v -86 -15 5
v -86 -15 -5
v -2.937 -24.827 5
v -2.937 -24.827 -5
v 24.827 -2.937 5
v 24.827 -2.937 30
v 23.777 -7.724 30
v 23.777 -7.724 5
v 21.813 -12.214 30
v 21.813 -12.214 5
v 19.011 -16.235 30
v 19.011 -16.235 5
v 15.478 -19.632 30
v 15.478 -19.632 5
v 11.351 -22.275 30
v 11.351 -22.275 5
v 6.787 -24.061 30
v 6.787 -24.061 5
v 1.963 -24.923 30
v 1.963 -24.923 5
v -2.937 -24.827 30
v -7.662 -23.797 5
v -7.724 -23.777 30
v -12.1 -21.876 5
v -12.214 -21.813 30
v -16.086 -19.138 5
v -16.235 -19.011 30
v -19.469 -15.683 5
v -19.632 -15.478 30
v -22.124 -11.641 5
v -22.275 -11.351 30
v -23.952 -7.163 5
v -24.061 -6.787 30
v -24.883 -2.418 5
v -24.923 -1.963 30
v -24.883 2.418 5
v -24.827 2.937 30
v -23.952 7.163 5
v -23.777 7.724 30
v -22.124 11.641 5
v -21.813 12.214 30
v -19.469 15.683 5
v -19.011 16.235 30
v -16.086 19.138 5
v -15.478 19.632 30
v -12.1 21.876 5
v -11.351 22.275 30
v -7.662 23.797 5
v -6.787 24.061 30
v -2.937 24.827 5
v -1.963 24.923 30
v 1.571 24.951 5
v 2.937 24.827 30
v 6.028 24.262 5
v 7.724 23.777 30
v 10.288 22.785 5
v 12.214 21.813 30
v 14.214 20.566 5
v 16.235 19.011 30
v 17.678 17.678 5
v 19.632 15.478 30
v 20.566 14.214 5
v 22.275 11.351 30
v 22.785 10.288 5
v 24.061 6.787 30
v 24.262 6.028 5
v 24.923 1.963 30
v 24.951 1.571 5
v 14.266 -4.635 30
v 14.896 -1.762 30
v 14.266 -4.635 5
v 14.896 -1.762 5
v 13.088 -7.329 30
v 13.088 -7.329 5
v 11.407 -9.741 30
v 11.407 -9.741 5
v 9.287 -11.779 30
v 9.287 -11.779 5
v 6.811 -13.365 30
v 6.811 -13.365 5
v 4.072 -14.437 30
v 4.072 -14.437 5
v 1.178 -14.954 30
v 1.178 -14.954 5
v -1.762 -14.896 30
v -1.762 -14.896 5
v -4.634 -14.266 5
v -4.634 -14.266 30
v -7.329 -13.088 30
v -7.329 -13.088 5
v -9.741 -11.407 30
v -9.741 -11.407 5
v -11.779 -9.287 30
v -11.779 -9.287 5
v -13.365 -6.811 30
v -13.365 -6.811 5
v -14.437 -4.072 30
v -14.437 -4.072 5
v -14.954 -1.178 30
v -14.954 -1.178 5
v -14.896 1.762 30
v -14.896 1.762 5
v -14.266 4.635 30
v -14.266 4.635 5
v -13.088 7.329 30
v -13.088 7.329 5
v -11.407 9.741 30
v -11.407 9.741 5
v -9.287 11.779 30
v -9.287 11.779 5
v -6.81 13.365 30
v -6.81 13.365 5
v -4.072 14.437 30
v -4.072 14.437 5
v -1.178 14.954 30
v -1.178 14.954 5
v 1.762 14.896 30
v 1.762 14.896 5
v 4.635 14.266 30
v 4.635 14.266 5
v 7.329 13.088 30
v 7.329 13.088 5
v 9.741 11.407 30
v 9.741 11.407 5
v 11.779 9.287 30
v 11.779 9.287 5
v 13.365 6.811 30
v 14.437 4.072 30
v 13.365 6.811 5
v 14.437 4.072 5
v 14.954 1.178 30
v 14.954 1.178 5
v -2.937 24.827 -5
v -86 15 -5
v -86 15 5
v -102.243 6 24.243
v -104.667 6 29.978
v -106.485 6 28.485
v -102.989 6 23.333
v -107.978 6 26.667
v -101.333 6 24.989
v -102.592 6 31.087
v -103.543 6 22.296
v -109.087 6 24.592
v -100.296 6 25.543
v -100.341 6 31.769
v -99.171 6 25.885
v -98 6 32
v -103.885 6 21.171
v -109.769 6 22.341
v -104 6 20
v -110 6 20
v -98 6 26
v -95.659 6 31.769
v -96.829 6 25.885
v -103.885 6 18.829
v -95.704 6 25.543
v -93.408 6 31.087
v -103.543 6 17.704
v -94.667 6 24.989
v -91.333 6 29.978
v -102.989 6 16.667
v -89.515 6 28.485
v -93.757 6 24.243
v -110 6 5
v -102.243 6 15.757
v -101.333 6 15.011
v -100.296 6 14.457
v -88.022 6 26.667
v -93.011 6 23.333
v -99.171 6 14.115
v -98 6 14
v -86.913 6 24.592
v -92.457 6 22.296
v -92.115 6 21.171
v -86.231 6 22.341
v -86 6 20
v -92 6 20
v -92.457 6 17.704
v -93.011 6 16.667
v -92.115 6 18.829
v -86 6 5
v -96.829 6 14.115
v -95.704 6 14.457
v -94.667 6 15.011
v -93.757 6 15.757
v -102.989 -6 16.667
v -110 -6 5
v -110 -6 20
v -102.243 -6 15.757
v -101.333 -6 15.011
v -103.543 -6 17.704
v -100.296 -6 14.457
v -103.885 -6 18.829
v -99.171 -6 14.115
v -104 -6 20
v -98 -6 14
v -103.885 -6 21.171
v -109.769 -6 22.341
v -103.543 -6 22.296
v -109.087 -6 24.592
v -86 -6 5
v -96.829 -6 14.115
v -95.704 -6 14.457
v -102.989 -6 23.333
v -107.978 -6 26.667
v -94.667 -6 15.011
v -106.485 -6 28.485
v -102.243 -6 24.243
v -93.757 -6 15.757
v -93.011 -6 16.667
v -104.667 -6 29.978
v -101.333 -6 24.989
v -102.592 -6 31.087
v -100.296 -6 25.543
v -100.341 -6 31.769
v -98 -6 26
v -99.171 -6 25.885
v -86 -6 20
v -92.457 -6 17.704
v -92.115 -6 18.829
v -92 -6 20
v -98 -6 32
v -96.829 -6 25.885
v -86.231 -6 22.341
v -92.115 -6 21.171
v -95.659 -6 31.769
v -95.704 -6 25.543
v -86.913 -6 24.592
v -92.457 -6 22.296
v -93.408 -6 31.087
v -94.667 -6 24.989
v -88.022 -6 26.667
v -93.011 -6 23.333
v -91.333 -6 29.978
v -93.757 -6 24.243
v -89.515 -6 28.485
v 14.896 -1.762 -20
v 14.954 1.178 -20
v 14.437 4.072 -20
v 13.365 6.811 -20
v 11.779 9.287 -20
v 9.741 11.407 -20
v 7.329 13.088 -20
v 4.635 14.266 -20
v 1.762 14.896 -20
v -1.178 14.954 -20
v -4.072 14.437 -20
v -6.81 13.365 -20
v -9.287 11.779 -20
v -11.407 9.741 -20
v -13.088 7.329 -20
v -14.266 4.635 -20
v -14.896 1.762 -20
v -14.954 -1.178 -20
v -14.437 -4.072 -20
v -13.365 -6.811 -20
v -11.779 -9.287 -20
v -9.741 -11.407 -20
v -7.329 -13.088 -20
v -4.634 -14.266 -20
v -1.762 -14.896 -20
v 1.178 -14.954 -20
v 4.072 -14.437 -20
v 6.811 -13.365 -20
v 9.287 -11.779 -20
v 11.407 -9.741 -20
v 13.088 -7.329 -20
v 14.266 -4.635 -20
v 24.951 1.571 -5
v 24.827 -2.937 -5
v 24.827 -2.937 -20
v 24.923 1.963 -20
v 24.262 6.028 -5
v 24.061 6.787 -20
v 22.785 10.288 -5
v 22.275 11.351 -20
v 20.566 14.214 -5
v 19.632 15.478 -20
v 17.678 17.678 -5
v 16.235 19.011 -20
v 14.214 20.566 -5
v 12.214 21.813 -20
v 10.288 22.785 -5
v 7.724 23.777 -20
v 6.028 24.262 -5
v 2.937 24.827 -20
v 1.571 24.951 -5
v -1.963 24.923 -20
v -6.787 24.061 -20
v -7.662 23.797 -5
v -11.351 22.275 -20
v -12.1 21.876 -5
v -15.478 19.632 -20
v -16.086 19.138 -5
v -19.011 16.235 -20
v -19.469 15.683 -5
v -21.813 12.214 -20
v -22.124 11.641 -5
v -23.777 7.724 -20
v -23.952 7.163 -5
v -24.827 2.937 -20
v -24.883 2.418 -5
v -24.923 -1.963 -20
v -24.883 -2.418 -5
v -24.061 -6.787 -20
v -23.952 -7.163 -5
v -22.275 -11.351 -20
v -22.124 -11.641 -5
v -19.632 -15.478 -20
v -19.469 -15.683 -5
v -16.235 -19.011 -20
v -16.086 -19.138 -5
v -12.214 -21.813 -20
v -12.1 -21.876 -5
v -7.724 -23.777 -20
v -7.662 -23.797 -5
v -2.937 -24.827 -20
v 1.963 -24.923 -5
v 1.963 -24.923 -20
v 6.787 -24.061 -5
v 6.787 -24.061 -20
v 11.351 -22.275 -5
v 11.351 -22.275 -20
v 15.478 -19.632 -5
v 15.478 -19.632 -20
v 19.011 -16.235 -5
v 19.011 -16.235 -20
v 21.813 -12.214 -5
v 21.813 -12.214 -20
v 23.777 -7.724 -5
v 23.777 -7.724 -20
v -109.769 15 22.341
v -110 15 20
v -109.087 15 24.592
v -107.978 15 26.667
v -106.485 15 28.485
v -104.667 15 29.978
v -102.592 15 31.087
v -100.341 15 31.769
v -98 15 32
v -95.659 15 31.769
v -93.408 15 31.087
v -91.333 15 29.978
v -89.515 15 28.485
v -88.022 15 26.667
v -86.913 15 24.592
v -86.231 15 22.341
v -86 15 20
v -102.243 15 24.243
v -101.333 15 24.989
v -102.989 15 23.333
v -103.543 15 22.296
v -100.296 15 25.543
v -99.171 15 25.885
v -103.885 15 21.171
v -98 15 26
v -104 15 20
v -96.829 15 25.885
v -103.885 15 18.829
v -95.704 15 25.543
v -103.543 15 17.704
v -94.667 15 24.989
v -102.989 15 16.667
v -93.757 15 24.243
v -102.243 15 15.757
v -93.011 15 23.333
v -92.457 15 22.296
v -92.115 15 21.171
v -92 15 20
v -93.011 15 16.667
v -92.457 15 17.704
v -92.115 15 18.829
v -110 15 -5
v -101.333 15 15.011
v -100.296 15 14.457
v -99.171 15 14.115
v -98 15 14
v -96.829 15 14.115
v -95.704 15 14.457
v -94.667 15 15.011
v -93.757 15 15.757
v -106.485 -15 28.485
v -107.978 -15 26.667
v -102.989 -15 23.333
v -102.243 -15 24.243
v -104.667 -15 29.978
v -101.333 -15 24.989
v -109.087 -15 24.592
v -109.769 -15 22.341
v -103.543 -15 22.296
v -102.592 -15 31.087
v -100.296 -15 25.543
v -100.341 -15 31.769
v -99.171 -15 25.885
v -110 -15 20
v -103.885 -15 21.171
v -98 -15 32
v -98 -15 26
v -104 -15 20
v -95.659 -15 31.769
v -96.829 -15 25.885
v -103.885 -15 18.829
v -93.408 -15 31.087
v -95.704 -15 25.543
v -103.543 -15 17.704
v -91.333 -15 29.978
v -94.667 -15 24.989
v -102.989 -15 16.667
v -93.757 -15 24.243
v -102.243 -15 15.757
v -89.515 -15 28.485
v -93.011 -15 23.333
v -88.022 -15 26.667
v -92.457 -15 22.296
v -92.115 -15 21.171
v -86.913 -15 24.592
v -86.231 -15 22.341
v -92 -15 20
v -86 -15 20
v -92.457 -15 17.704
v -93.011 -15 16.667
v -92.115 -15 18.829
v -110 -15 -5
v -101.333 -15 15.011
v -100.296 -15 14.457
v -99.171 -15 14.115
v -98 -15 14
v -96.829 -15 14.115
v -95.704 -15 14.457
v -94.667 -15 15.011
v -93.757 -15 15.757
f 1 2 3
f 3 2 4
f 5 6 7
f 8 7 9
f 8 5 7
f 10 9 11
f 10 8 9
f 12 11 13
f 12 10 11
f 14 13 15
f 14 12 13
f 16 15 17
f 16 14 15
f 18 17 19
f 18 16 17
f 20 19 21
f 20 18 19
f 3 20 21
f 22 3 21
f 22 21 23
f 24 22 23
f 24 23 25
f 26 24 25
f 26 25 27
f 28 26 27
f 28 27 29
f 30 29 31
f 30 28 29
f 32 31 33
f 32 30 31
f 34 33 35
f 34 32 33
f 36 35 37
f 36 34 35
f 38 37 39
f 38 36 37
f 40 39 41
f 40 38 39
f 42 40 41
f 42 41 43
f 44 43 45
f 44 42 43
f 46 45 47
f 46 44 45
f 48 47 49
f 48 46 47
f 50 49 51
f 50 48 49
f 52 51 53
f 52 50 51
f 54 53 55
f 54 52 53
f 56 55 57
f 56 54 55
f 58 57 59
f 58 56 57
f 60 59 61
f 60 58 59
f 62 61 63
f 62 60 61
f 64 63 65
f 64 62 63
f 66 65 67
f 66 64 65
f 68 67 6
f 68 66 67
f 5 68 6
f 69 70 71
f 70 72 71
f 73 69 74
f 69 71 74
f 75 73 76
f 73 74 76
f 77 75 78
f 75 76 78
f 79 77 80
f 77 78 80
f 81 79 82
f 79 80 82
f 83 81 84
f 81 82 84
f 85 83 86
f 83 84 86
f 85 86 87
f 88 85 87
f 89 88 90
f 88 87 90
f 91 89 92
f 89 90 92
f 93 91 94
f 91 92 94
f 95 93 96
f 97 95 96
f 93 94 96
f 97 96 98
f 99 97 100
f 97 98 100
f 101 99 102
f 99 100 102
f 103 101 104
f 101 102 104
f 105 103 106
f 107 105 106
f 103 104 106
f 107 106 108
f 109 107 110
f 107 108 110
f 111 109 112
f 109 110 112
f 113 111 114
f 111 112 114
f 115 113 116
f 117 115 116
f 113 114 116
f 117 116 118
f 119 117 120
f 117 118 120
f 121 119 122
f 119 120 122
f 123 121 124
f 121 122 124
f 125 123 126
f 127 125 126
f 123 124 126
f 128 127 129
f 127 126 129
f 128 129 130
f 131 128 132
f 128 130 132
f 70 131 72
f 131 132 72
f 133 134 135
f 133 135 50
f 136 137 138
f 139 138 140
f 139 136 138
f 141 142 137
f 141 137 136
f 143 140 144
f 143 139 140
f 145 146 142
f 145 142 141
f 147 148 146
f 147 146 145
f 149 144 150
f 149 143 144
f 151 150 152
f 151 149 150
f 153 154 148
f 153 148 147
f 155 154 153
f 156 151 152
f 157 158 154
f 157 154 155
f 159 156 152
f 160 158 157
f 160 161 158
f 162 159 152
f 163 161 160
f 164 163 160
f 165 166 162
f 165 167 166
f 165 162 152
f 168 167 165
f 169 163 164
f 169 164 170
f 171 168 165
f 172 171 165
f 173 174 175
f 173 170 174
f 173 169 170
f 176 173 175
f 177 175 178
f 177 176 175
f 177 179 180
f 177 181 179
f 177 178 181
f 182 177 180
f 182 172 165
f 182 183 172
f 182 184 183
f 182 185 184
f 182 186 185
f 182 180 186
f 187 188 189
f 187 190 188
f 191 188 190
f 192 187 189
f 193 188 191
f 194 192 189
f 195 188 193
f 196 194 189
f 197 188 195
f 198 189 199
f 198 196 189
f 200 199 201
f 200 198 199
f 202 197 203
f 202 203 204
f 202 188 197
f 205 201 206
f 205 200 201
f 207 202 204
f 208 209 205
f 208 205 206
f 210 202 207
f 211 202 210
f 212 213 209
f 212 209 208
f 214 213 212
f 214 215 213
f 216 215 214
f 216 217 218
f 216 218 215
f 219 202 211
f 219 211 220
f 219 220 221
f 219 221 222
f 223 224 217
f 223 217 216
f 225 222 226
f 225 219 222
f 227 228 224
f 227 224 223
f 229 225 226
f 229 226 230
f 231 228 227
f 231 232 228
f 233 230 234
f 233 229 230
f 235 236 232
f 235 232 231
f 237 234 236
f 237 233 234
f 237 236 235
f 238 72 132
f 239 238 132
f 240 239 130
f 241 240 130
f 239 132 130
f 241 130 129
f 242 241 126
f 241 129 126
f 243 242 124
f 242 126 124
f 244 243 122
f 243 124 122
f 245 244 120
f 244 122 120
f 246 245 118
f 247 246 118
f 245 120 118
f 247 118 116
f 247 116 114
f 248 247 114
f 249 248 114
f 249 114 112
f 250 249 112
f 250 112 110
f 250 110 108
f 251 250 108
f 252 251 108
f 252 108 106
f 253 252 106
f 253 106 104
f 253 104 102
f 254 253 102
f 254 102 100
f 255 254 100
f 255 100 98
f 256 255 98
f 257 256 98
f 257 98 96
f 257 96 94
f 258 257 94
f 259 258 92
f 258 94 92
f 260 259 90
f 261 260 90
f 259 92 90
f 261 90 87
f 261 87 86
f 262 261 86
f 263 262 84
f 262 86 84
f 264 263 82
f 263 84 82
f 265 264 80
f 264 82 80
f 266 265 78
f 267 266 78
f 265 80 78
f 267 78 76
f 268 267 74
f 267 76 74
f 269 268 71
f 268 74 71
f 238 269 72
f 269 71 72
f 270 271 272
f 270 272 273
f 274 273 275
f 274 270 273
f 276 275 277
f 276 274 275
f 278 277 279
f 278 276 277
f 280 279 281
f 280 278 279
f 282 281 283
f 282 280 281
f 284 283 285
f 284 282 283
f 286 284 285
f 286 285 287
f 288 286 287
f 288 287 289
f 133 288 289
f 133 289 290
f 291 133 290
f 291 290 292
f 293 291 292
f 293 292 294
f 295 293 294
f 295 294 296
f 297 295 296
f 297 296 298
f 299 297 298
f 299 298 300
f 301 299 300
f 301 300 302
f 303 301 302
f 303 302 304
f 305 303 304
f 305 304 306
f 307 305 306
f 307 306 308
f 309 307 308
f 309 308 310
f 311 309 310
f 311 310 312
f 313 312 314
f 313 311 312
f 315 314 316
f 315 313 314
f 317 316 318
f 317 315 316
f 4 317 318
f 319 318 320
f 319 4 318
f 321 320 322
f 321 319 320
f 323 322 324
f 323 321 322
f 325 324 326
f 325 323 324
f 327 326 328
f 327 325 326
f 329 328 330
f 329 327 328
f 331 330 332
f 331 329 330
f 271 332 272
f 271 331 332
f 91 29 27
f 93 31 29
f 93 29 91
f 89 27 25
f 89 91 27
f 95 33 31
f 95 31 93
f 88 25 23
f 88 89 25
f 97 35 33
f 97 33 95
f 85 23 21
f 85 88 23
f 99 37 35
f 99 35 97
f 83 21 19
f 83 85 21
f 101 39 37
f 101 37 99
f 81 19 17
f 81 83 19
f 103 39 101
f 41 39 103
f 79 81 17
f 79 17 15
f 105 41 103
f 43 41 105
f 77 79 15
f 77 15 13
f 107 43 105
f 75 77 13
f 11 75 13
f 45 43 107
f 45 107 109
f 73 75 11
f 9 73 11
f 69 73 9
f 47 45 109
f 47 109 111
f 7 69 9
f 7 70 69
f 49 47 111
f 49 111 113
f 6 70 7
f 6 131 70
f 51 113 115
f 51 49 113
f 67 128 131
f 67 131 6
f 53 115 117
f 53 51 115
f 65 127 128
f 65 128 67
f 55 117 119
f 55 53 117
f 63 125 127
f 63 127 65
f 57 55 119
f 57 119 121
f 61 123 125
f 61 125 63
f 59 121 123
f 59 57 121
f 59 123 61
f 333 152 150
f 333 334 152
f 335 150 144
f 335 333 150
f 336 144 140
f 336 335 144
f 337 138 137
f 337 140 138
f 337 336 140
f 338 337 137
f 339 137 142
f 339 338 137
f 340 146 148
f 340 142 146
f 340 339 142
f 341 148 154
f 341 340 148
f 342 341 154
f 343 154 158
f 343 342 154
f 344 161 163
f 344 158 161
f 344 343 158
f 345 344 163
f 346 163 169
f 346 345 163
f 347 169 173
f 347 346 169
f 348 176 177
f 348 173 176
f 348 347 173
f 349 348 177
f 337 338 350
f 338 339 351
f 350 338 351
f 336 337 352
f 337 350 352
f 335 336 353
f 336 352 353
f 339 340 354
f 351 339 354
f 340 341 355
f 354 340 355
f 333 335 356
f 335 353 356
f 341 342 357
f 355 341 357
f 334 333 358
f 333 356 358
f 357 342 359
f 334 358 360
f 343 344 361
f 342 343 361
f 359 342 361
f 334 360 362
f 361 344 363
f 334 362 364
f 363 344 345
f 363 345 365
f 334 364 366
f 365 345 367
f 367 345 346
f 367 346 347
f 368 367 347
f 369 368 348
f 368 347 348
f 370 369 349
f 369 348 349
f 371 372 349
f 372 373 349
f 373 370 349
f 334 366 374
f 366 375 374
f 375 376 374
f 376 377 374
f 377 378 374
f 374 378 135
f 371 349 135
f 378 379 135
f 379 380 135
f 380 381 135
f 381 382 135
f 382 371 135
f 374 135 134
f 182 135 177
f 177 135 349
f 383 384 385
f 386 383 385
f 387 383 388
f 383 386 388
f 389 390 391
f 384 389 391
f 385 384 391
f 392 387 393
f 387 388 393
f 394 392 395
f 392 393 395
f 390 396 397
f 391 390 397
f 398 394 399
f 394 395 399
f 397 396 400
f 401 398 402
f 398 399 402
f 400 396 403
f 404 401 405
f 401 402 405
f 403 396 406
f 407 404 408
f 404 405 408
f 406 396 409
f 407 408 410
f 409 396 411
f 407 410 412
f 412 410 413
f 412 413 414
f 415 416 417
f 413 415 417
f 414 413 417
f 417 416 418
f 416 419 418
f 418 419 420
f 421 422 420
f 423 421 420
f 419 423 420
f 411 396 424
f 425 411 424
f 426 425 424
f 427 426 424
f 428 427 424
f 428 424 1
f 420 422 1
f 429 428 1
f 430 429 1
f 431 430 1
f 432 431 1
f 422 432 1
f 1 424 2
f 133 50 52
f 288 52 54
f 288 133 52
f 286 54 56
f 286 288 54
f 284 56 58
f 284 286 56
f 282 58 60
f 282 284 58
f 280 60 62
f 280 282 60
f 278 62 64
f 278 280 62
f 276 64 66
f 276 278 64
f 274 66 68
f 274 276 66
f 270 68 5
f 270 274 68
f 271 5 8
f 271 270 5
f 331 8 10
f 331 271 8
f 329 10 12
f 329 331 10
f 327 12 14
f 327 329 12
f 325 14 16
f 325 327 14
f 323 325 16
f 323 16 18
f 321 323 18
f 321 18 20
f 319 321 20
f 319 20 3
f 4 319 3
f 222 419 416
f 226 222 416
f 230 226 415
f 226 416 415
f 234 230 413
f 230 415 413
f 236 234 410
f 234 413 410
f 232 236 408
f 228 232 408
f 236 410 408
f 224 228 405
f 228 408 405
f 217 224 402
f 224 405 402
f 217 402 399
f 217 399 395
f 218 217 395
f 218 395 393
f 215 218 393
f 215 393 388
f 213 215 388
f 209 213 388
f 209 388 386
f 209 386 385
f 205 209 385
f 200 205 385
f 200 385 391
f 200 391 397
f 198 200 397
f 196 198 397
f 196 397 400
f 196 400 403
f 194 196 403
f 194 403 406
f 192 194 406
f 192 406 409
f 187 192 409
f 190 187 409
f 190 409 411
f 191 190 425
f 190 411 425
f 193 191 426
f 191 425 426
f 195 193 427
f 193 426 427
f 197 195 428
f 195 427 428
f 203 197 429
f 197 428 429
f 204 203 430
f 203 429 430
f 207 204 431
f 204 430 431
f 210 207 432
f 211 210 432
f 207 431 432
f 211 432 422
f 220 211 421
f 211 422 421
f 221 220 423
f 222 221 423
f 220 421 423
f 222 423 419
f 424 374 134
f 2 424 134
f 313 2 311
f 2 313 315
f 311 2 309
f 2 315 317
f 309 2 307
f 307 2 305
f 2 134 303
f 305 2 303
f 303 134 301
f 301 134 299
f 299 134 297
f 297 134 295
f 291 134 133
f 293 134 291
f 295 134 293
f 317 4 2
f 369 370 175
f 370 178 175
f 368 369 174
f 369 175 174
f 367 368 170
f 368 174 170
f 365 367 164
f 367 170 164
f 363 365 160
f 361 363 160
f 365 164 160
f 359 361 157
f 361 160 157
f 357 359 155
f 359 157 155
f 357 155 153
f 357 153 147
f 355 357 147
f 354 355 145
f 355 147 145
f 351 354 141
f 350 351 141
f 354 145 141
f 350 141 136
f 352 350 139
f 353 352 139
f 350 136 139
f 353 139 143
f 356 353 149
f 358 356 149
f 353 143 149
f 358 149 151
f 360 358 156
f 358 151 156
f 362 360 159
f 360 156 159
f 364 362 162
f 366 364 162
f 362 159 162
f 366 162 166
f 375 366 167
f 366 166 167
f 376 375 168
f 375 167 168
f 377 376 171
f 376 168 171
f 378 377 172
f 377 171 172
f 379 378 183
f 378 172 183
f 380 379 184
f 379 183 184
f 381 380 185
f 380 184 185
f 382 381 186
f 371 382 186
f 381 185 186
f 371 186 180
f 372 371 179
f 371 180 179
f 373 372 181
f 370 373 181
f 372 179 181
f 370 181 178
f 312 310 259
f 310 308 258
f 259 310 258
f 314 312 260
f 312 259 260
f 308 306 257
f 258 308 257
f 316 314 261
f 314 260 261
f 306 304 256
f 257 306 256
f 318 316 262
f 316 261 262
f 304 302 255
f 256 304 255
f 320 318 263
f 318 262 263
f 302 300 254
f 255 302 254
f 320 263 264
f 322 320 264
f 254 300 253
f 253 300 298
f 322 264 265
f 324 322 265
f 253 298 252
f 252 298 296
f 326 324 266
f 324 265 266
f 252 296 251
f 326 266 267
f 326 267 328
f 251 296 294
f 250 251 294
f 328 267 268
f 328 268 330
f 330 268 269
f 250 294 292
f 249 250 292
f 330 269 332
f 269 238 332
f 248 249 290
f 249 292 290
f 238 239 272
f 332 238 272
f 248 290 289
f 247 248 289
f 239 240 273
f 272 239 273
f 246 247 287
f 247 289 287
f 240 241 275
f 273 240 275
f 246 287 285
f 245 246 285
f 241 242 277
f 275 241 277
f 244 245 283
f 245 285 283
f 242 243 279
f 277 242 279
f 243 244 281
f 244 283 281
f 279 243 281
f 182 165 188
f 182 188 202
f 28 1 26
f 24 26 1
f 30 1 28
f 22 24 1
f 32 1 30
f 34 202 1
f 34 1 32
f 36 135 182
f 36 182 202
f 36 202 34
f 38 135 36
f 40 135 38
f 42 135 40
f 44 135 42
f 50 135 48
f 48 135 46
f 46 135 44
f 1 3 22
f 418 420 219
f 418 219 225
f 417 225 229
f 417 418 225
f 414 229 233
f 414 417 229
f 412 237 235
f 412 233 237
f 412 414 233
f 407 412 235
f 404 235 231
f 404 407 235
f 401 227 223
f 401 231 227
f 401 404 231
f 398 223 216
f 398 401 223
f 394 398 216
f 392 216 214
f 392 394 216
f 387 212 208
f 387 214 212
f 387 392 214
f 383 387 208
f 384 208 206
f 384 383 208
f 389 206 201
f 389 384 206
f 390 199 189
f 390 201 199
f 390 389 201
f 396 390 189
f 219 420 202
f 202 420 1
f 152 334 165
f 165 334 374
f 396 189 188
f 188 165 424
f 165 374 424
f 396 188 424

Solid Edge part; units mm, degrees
sketch "Sketch1" plane through (0, 0, 0) normal (0, 0, 1) x (1, 0, 0)
  line L0 (-86, -15) -> (-2.9372, -24.8269)
  line L1 (-86, 15) -> (-2.9372, 24.8269)
  line L2 (-110, 15) -> (-86, 15)
  line L3 (-110, 0) -> (-110, 15)
  line L4 (-110, 0) -> (-110, -15)
  line L5 (-110, -15) -> (-86, -15)
  arc A0 (-2.9372, 24.8269) -> (-2.9372, -24.8269) centre (0, 0) cw
extrude "Protrusion1" add sketch "Sketch1" along normal mid plane 10
sketch "Sketch2" plane through (-42.5, 0, 5) normal (0, 0, 1) x (0.9930744, -0.117487, 0)
  circle A0 centre (42.2057, 4.9932) radius 25
extrude "ExtrudedProtrusion_2" add sketch "Sketch2" along normal mid plane 50
sketch "Sketch3" plane through (-42.5, 0, 5) normal (0, 0, 1) x (0.9930744, -0.117487, 0)
  circle A0 centre (42.2057, 4.9932) radius 15
extrude "Cutout1" cut sketch "Sketch3" along normal through all and the other way through all
sketch "Sketch4" plane through (-98, -15, 0) normal (0, -1, 0) x (1, 0, 0)
  line L0 (12, 20) -> (12, -5)
  arc A0 (-12, 20) -> (12, 20) centre (0, 20) cw
  line L1 (-12, -5) -> (-12, 20)
extrude "ExtrudedProtrusion_3" add sketch "Sketch4" against normal blind 9 material side at (-85.95, -15, 7.5)
sketch "Sketch5" plane through (-98, 15, 0) normal (0, 1, 0) x (-1, 0, 0)
  line L0 (12, 20) -> (12, -5)
  arc A0 (-12, 20) -> (12, 20) centre (0, 20) cw
  line L1 (-12, -5) -> (-12, 20)
extrude "ExtrudedProtrusion_4" add sketch "Sketch5" against normal blind 9 material side at (-110.05, 15, 7.5)
sketch "Sketch6" plane through (-98, -15, 0) normal (0, -1, 0) x (1, 0, 0)
  circle A0 centre (0, 20) radius 6
extrude "Cutout2" cut sketch "Sketch6" against normal through all
